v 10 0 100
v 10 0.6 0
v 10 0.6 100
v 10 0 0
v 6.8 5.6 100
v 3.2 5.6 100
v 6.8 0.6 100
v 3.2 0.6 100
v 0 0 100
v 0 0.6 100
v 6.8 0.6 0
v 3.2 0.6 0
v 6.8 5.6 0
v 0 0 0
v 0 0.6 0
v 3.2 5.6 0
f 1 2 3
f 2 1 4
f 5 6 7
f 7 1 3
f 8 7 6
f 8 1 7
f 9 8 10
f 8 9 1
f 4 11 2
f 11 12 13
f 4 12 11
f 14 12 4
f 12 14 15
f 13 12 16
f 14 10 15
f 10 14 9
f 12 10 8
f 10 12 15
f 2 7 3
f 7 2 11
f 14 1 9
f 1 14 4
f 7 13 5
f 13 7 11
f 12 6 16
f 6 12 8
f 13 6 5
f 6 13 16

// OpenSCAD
// Parameters for the inverted T-profile
horizontal_width = 10;
horizontal_thickness = 0.6;
vertical_thickness = 3.6;
vertical_height = 5;
length = 100;

module profile_T_inverted() {
    union() {
        // Horizontal bar (flat)
        cube([horizontal_width, horizontal_thickness, length]);

        // Vertical stem that "rises", centered on the width
        translate([
            (horizontal_width - vertical_thickness)/2,
            horizontal_thickness,
            0
        ])
        cube([vertical_thickness, vertical_height, length]);
    }
}

// Module call
profile_T_inverted();
